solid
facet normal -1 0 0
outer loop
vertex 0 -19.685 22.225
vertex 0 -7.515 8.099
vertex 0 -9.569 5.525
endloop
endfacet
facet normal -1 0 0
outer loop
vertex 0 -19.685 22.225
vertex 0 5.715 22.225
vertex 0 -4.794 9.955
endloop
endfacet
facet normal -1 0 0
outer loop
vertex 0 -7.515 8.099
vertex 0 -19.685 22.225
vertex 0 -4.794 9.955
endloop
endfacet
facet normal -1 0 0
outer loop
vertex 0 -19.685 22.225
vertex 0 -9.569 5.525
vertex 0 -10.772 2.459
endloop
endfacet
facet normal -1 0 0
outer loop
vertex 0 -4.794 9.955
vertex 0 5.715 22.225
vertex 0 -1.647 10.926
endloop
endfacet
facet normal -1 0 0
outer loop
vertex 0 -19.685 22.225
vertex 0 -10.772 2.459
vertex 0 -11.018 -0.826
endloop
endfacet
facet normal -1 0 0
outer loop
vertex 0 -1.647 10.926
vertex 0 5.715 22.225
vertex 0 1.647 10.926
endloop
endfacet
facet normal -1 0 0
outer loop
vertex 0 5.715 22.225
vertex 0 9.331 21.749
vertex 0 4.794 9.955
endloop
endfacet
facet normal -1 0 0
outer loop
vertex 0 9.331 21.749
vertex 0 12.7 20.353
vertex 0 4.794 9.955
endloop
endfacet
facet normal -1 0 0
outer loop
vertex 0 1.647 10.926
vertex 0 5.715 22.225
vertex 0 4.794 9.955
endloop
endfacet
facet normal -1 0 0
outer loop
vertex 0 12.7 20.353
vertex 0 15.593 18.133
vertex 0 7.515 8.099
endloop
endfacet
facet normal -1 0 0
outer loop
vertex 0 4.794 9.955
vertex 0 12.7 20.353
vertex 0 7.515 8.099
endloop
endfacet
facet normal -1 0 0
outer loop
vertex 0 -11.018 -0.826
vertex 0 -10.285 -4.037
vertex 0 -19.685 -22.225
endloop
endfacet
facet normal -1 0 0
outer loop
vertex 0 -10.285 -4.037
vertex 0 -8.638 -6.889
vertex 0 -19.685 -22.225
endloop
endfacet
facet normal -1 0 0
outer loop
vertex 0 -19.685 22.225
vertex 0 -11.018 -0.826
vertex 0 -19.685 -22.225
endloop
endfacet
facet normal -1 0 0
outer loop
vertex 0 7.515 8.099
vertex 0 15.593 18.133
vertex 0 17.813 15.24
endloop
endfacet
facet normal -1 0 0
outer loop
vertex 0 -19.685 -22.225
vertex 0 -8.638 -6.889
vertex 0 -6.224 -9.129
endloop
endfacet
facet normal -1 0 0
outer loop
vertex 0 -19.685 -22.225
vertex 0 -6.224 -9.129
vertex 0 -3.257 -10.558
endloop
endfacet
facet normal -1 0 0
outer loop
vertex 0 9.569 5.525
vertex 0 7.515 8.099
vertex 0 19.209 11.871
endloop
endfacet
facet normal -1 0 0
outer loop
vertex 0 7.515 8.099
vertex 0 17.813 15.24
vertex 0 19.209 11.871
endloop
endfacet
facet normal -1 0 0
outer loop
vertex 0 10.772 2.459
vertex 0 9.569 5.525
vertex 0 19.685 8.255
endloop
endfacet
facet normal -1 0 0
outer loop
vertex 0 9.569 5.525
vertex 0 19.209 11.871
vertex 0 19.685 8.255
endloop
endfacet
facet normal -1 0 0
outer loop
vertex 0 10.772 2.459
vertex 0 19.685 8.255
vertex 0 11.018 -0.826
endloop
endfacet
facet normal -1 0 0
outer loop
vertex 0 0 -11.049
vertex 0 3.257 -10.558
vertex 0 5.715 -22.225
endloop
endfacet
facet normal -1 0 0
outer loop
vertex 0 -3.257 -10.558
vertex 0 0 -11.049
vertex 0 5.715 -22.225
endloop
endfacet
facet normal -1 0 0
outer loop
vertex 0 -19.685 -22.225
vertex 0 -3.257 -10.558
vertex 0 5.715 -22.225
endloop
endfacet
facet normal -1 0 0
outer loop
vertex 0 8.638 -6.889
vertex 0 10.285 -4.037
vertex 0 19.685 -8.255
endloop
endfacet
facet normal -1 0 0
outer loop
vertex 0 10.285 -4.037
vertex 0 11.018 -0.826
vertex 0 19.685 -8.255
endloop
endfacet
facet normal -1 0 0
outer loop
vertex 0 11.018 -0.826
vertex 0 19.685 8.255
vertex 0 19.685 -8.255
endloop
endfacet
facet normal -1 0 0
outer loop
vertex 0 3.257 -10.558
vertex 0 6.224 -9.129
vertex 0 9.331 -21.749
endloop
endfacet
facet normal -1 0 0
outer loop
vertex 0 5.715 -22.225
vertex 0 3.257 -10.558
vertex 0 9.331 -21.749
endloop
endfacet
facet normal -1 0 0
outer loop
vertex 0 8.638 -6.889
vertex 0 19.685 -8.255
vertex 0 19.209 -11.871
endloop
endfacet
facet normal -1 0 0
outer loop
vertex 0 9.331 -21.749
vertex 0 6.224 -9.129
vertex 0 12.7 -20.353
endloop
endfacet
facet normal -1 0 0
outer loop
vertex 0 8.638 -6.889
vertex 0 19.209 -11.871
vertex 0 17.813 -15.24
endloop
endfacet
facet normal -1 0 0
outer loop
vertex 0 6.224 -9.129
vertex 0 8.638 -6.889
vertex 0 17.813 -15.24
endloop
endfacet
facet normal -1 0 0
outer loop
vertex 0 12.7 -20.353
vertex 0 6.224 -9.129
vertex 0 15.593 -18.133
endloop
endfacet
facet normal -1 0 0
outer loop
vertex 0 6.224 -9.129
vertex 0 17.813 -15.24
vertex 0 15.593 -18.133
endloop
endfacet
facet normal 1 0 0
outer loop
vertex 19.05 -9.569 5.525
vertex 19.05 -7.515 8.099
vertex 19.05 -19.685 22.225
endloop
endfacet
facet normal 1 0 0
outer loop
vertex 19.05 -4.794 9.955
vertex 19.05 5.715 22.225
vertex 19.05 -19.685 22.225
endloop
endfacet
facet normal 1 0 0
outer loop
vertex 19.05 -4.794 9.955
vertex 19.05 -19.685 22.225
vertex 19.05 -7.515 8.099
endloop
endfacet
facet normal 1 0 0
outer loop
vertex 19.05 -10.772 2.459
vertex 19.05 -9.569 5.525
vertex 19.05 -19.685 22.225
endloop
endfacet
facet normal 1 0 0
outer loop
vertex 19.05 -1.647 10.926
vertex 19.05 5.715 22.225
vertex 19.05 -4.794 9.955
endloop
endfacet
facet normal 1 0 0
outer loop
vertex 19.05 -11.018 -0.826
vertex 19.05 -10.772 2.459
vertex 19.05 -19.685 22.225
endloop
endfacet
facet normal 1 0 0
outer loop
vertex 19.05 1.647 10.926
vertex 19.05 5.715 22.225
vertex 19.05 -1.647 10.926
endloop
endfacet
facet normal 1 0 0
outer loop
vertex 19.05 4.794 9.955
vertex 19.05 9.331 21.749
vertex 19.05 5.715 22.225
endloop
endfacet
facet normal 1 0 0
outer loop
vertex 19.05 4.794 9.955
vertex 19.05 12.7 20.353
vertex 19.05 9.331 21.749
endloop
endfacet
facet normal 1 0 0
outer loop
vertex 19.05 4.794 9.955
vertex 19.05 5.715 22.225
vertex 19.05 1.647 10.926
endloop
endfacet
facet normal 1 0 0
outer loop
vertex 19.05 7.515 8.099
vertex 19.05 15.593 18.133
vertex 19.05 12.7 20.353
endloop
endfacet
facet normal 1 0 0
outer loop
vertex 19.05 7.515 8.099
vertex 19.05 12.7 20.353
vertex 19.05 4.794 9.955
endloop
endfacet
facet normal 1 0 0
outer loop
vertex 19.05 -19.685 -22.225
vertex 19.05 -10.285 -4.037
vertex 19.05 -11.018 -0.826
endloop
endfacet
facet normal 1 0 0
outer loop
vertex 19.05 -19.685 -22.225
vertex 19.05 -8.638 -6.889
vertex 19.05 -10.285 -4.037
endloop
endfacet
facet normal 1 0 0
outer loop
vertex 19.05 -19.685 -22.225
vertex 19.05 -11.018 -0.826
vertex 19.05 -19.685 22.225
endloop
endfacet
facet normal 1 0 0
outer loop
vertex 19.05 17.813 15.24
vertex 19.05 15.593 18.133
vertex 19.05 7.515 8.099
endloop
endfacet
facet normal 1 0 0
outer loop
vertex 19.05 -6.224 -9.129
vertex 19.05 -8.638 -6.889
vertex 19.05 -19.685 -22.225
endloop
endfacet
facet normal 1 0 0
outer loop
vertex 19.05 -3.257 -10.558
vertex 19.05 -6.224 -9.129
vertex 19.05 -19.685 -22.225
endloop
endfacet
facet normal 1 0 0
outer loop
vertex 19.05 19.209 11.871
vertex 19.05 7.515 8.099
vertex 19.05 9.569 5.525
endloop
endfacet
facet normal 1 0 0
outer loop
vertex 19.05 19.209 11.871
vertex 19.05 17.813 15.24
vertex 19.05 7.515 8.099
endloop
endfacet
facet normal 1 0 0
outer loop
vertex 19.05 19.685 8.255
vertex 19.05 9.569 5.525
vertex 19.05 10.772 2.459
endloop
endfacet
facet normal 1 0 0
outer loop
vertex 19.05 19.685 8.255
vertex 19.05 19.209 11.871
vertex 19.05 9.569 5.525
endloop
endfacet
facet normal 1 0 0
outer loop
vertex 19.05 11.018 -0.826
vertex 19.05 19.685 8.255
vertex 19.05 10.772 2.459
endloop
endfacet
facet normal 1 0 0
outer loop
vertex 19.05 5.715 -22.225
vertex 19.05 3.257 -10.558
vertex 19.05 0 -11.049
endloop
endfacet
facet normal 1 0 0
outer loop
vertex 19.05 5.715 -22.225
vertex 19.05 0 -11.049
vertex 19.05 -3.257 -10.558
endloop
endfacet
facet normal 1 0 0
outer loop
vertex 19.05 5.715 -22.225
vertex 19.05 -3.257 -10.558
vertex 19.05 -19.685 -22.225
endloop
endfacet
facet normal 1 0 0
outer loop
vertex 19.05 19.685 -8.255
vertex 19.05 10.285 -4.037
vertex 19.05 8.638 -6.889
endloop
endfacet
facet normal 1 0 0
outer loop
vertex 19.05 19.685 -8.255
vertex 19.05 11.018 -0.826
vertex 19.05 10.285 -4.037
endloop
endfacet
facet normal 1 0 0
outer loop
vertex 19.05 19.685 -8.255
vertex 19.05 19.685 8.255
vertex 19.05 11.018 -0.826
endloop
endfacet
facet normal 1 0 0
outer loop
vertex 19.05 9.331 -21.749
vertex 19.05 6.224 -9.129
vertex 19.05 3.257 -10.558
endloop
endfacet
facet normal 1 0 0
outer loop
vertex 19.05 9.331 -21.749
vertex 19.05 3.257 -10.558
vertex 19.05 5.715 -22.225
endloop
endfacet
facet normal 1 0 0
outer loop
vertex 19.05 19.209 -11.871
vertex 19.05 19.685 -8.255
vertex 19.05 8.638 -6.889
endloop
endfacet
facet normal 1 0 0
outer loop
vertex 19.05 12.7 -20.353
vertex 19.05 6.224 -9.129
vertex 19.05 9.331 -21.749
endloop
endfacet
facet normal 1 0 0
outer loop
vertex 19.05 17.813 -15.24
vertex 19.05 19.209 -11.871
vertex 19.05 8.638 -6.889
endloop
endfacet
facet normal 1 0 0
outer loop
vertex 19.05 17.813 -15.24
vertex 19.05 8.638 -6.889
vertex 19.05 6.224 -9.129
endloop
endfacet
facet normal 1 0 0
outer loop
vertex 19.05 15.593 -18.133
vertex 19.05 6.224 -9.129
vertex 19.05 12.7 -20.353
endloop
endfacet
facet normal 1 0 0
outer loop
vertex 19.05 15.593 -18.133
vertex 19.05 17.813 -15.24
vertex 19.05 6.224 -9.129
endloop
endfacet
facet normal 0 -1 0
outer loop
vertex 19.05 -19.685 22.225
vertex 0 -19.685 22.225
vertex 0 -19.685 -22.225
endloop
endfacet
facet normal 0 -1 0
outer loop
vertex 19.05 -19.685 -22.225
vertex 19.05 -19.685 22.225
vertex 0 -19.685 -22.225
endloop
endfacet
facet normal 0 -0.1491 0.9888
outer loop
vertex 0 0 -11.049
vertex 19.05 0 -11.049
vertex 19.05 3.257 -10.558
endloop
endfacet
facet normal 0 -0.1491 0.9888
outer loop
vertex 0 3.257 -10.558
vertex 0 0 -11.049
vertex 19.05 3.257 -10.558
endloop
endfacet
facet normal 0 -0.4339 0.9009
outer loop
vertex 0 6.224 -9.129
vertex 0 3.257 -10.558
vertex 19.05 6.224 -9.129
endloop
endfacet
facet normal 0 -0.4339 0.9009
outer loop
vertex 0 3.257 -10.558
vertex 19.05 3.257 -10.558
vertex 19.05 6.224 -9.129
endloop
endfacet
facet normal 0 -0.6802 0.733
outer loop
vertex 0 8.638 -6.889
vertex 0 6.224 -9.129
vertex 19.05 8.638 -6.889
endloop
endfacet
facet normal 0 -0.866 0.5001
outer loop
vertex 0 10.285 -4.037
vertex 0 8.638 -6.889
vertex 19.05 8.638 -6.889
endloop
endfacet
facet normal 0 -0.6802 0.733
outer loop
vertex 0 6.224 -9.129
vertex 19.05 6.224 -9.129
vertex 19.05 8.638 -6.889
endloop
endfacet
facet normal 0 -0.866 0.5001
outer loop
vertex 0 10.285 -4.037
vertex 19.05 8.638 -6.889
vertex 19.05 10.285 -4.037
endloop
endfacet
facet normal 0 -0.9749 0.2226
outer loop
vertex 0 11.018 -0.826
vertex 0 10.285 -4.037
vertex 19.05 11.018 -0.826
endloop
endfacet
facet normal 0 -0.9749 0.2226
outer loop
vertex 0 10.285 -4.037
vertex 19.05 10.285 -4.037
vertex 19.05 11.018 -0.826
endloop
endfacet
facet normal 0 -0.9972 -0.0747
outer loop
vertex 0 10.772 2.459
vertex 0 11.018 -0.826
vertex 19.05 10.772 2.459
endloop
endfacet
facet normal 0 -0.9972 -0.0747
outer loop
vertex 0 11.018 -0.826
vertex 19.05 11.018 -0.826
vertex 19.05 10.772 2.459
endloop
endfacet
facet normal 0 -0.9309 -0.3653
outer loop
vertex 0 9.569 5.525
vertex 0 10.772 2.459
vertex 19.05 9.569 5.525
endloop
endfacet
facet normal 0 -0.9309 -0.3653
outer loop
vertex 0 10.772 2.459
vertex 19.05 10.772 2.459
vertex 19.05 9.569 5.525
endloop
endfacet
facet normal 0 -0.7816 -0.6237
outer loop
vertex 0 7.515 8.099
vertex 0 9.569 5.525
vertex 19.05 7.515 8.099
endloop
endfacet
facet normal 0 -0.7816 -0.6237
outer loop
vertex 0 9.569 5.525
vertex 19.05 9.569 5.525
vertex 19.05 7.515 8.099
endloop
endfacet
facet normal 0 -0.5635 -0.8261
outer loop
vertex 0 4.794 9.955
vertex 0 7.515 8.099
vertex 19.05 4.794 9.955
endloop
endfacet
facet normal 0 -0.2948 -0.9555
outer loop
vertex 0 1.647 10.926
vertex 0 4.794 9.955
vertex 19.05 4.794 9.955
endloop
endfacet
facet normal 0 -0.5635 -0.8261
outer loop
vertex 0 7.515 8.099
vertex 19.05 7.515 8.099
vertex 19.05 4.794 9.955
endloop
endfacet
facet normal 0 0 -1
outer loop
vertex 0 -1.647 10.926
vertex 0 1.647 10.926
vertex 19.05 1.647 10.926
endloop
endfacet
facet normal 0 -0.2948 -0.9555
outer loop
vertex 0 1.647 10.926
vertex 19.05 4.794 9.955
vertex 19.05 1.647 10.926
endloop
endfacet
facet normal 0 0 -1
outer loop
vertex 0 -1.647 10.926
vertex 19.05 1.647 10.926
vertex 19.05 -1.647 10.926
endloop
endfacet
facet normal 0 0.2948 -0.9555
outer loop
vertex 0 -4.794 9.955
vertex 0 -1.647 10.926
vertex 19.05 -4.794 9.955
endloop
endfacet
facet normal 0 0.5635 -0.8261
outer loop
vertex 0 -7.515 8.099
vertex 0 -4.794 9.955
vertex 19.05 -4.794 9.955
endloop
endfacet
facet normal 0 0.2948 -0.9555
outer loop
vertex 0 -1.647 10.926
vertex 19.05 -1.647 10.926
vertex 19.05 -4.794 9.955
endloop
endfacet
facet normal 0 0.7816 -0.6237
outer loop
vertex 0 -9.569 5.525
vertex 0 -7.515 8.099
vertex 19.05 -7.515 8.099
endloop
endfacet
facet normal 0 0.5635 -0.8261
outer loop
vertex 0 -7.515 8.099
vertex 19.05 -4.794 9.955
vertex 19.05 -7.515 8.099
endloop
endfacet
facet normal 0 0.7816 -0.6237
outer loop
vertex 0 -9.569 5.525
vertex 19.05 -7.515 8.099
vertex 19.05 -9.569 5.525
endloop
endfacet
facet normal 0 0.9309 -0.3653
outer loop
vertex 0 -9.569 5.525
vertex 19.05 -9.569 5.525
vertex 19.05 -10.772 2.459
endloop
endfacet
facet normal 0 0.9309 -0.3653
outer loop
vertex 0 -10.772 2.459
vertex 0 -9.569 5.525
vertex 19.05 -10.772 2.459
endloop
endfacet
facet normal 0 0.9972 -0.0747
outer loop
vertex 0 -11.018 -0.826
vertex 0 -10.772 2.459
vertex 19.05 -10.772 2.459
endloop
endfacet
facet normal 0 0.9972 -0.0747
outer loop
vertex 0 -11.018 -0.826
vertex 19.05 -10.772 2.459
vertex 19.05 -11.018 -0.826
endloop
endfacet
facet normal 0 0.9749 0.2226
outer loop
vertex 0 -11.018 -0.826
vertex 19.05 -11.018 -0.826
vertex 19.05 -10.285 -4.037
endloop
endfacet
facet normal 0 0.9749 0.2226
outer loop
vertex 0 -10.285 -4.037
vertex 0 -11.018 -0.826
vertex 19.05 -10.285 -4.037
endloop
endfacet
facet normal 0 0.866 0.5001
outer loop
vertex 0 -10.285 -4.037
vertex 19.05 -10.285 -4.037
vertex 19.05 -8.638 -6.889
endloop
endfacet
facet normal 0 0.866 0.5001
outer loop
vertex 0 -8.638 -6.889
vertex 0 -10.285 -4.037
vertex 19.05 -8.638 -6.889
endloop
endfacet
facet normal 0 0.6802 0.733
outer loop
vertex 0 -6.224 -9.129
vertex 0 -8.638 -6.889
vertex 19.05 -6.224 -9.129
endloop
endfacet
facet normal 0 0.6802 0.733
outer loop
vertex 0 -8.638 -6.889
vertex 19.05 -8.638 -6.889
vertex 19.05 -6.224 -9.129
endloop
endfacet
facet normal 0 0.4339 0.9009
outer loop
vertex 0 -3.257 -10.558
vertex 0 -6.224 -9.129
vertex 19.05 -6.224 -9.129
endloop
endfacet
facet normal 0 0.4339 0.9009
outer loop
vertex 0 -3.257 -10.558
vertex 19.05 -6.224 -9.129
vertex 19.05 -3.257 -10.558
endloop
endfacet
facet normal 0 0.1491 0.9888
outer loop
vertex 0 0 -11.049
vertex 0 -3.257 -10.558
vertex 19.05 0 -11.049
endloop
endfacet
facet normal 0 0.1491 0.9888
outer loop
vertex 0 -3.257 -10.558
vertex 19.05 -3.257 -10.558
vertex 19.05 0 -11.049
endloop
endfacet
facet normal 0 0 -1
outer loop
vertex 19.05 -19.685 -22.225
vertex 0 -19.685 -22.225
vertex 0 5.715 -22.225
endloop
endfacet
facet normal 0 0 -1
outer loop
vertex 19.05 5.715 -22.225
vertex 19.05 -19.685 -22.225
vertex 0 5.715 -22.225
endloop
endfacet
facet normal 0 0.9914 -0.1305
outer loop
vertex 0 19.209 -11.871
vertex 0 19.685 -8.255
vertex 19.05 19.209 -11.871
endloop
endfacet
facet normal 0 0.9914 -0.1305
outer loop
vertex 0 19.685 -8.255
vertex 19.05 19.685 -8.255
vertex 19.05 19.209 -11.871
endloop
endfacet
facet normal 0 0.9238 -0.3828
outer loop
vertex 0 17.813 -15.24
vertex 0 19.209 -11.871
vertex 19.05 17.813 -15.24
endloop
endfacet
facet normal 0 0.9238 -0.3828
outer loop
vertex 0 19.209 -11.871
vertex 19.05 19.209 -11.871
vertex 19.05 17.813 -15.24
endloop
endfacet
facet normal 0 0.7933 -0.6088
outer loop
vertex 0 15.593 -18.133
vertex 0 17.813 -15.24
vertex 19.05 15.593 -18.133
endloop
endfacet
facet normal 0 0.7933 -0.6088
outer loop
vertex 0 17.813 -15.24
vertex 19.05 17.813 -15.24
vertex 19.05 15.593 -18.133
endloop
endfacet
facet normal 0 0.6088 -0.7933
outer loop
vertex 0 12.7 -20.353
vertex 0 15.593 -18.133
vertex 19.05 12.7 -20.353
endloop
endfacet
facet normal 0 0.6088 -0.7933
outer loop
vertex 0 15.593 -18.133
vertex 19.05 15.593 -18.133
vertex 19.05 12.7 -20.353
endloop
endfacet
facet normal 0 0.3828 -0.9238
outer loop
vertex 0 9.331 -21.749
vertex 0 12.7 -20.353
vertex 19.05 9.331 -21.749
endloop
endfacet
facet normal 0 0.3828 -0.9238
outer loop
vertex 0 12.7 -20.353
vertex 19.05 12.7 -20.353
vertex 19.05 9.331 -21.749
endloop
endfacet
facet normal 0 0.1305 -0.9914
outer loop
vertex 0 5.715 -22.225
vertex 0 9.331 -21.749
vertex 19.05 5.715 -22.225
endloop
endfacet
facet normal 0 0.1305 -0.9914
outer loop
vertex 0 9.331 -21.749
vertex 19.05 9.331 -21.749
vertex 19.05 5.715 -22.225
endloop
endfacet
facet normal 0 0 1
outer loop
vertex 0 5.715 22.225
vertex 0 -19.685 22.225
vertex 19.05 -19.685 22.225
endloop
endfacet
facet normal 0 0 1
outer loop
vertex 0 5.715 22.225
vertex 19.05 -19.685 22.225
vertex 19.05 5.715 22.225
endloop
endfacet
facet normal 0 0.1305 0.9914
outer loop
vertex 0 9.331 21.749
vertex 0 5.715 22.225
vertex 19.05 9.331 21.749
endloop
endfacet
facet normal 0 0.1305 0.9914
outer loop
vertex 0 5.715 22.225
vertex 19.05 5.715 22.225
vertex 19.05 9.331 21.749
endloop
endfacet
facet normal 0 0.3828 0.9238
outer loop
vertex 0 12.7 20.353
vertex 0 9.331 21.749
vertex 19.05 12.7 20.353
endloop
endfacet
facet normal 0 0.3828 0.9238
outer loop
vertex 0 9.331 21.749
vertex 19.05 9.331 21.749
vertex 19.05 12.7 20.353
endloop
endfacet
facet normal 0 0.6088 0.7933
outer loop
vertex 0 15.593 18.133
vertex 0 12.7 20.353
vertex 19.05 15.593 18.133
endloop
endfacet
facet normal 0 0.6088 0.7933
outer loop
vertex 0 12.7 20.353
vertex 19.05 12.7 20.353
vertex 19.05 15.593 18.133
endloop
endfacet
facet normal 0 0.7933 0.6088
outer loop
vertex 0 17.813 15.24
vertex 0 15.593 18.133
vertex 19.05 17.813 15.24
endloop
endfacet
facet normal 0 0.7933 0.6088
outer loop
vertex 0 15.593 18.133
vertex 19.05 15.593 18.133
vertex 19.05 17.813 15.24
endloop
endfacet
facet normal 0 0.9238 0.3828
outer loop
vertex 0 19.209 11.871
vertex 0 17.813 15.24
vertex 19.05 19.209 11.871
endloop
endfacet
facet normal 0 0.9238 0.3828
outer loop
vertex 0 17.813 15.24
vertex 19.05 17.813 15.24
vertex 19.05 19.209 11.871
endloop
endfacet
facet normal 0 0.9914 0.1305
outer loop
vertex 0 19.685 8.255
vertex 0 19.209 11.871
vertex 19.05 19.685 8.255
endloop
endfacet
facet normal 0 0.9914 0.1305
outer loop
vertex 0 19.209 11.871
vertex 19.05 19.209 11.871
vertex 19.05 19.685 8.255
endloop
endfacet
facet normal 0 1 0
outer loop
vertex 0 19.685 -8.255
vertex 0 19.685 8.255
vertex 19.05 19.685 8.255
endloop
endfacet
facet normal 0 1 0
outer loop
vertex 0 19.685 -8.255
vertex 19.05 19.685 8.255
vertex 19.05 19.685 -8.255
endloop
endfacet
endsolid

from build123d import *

# Parameters (mm, degrees)
SKETCH1_W           = 44.45
SKETCH1_H           = 39.37
BOSS_EXTRUDE1_DEPTH = 19.05
SKETCH2_R           = 11.049
CUT_EXTRUDE1_DEPTH  = 19.05
FILLET1_R           = 13.97


with BuildPart() as part:
    # Sketch1 → Boss-Extrude1 (new body)
    with BuildSketch(Plane(origin=(0, 0, 0), x_dir=(0, 0, -1), z_dir=(1, 0, 0))):
        Rectangle(SKETCH1_W, SKETCH1_H)
    extrude(amount=BOSS_EXTRUDE1_DEPTH)

    # Sketch2 → Cut-Extrude1 (cut)
    with BuildSketch(Plane(origin=(19.05, 0, 0), x_dir=(0, 0, -1), z_dir=(1, 0, 0))):
        Circle(SKETCH2_R)
    extrude(amount=-CUT_EXTRUDE1_DEPTH, mode=Mode.SUBTRACT)

    # Fillet1
    fillet1_edges = [part.edges().sort_by_distance(p)[0] for p in [
        (9.525, 19.685, 22.225),
        (9.525, 19.685, -22.225),
    ]]
    fillet(fillet1_edges, radius=FILLET1_R)


solid = part.part
